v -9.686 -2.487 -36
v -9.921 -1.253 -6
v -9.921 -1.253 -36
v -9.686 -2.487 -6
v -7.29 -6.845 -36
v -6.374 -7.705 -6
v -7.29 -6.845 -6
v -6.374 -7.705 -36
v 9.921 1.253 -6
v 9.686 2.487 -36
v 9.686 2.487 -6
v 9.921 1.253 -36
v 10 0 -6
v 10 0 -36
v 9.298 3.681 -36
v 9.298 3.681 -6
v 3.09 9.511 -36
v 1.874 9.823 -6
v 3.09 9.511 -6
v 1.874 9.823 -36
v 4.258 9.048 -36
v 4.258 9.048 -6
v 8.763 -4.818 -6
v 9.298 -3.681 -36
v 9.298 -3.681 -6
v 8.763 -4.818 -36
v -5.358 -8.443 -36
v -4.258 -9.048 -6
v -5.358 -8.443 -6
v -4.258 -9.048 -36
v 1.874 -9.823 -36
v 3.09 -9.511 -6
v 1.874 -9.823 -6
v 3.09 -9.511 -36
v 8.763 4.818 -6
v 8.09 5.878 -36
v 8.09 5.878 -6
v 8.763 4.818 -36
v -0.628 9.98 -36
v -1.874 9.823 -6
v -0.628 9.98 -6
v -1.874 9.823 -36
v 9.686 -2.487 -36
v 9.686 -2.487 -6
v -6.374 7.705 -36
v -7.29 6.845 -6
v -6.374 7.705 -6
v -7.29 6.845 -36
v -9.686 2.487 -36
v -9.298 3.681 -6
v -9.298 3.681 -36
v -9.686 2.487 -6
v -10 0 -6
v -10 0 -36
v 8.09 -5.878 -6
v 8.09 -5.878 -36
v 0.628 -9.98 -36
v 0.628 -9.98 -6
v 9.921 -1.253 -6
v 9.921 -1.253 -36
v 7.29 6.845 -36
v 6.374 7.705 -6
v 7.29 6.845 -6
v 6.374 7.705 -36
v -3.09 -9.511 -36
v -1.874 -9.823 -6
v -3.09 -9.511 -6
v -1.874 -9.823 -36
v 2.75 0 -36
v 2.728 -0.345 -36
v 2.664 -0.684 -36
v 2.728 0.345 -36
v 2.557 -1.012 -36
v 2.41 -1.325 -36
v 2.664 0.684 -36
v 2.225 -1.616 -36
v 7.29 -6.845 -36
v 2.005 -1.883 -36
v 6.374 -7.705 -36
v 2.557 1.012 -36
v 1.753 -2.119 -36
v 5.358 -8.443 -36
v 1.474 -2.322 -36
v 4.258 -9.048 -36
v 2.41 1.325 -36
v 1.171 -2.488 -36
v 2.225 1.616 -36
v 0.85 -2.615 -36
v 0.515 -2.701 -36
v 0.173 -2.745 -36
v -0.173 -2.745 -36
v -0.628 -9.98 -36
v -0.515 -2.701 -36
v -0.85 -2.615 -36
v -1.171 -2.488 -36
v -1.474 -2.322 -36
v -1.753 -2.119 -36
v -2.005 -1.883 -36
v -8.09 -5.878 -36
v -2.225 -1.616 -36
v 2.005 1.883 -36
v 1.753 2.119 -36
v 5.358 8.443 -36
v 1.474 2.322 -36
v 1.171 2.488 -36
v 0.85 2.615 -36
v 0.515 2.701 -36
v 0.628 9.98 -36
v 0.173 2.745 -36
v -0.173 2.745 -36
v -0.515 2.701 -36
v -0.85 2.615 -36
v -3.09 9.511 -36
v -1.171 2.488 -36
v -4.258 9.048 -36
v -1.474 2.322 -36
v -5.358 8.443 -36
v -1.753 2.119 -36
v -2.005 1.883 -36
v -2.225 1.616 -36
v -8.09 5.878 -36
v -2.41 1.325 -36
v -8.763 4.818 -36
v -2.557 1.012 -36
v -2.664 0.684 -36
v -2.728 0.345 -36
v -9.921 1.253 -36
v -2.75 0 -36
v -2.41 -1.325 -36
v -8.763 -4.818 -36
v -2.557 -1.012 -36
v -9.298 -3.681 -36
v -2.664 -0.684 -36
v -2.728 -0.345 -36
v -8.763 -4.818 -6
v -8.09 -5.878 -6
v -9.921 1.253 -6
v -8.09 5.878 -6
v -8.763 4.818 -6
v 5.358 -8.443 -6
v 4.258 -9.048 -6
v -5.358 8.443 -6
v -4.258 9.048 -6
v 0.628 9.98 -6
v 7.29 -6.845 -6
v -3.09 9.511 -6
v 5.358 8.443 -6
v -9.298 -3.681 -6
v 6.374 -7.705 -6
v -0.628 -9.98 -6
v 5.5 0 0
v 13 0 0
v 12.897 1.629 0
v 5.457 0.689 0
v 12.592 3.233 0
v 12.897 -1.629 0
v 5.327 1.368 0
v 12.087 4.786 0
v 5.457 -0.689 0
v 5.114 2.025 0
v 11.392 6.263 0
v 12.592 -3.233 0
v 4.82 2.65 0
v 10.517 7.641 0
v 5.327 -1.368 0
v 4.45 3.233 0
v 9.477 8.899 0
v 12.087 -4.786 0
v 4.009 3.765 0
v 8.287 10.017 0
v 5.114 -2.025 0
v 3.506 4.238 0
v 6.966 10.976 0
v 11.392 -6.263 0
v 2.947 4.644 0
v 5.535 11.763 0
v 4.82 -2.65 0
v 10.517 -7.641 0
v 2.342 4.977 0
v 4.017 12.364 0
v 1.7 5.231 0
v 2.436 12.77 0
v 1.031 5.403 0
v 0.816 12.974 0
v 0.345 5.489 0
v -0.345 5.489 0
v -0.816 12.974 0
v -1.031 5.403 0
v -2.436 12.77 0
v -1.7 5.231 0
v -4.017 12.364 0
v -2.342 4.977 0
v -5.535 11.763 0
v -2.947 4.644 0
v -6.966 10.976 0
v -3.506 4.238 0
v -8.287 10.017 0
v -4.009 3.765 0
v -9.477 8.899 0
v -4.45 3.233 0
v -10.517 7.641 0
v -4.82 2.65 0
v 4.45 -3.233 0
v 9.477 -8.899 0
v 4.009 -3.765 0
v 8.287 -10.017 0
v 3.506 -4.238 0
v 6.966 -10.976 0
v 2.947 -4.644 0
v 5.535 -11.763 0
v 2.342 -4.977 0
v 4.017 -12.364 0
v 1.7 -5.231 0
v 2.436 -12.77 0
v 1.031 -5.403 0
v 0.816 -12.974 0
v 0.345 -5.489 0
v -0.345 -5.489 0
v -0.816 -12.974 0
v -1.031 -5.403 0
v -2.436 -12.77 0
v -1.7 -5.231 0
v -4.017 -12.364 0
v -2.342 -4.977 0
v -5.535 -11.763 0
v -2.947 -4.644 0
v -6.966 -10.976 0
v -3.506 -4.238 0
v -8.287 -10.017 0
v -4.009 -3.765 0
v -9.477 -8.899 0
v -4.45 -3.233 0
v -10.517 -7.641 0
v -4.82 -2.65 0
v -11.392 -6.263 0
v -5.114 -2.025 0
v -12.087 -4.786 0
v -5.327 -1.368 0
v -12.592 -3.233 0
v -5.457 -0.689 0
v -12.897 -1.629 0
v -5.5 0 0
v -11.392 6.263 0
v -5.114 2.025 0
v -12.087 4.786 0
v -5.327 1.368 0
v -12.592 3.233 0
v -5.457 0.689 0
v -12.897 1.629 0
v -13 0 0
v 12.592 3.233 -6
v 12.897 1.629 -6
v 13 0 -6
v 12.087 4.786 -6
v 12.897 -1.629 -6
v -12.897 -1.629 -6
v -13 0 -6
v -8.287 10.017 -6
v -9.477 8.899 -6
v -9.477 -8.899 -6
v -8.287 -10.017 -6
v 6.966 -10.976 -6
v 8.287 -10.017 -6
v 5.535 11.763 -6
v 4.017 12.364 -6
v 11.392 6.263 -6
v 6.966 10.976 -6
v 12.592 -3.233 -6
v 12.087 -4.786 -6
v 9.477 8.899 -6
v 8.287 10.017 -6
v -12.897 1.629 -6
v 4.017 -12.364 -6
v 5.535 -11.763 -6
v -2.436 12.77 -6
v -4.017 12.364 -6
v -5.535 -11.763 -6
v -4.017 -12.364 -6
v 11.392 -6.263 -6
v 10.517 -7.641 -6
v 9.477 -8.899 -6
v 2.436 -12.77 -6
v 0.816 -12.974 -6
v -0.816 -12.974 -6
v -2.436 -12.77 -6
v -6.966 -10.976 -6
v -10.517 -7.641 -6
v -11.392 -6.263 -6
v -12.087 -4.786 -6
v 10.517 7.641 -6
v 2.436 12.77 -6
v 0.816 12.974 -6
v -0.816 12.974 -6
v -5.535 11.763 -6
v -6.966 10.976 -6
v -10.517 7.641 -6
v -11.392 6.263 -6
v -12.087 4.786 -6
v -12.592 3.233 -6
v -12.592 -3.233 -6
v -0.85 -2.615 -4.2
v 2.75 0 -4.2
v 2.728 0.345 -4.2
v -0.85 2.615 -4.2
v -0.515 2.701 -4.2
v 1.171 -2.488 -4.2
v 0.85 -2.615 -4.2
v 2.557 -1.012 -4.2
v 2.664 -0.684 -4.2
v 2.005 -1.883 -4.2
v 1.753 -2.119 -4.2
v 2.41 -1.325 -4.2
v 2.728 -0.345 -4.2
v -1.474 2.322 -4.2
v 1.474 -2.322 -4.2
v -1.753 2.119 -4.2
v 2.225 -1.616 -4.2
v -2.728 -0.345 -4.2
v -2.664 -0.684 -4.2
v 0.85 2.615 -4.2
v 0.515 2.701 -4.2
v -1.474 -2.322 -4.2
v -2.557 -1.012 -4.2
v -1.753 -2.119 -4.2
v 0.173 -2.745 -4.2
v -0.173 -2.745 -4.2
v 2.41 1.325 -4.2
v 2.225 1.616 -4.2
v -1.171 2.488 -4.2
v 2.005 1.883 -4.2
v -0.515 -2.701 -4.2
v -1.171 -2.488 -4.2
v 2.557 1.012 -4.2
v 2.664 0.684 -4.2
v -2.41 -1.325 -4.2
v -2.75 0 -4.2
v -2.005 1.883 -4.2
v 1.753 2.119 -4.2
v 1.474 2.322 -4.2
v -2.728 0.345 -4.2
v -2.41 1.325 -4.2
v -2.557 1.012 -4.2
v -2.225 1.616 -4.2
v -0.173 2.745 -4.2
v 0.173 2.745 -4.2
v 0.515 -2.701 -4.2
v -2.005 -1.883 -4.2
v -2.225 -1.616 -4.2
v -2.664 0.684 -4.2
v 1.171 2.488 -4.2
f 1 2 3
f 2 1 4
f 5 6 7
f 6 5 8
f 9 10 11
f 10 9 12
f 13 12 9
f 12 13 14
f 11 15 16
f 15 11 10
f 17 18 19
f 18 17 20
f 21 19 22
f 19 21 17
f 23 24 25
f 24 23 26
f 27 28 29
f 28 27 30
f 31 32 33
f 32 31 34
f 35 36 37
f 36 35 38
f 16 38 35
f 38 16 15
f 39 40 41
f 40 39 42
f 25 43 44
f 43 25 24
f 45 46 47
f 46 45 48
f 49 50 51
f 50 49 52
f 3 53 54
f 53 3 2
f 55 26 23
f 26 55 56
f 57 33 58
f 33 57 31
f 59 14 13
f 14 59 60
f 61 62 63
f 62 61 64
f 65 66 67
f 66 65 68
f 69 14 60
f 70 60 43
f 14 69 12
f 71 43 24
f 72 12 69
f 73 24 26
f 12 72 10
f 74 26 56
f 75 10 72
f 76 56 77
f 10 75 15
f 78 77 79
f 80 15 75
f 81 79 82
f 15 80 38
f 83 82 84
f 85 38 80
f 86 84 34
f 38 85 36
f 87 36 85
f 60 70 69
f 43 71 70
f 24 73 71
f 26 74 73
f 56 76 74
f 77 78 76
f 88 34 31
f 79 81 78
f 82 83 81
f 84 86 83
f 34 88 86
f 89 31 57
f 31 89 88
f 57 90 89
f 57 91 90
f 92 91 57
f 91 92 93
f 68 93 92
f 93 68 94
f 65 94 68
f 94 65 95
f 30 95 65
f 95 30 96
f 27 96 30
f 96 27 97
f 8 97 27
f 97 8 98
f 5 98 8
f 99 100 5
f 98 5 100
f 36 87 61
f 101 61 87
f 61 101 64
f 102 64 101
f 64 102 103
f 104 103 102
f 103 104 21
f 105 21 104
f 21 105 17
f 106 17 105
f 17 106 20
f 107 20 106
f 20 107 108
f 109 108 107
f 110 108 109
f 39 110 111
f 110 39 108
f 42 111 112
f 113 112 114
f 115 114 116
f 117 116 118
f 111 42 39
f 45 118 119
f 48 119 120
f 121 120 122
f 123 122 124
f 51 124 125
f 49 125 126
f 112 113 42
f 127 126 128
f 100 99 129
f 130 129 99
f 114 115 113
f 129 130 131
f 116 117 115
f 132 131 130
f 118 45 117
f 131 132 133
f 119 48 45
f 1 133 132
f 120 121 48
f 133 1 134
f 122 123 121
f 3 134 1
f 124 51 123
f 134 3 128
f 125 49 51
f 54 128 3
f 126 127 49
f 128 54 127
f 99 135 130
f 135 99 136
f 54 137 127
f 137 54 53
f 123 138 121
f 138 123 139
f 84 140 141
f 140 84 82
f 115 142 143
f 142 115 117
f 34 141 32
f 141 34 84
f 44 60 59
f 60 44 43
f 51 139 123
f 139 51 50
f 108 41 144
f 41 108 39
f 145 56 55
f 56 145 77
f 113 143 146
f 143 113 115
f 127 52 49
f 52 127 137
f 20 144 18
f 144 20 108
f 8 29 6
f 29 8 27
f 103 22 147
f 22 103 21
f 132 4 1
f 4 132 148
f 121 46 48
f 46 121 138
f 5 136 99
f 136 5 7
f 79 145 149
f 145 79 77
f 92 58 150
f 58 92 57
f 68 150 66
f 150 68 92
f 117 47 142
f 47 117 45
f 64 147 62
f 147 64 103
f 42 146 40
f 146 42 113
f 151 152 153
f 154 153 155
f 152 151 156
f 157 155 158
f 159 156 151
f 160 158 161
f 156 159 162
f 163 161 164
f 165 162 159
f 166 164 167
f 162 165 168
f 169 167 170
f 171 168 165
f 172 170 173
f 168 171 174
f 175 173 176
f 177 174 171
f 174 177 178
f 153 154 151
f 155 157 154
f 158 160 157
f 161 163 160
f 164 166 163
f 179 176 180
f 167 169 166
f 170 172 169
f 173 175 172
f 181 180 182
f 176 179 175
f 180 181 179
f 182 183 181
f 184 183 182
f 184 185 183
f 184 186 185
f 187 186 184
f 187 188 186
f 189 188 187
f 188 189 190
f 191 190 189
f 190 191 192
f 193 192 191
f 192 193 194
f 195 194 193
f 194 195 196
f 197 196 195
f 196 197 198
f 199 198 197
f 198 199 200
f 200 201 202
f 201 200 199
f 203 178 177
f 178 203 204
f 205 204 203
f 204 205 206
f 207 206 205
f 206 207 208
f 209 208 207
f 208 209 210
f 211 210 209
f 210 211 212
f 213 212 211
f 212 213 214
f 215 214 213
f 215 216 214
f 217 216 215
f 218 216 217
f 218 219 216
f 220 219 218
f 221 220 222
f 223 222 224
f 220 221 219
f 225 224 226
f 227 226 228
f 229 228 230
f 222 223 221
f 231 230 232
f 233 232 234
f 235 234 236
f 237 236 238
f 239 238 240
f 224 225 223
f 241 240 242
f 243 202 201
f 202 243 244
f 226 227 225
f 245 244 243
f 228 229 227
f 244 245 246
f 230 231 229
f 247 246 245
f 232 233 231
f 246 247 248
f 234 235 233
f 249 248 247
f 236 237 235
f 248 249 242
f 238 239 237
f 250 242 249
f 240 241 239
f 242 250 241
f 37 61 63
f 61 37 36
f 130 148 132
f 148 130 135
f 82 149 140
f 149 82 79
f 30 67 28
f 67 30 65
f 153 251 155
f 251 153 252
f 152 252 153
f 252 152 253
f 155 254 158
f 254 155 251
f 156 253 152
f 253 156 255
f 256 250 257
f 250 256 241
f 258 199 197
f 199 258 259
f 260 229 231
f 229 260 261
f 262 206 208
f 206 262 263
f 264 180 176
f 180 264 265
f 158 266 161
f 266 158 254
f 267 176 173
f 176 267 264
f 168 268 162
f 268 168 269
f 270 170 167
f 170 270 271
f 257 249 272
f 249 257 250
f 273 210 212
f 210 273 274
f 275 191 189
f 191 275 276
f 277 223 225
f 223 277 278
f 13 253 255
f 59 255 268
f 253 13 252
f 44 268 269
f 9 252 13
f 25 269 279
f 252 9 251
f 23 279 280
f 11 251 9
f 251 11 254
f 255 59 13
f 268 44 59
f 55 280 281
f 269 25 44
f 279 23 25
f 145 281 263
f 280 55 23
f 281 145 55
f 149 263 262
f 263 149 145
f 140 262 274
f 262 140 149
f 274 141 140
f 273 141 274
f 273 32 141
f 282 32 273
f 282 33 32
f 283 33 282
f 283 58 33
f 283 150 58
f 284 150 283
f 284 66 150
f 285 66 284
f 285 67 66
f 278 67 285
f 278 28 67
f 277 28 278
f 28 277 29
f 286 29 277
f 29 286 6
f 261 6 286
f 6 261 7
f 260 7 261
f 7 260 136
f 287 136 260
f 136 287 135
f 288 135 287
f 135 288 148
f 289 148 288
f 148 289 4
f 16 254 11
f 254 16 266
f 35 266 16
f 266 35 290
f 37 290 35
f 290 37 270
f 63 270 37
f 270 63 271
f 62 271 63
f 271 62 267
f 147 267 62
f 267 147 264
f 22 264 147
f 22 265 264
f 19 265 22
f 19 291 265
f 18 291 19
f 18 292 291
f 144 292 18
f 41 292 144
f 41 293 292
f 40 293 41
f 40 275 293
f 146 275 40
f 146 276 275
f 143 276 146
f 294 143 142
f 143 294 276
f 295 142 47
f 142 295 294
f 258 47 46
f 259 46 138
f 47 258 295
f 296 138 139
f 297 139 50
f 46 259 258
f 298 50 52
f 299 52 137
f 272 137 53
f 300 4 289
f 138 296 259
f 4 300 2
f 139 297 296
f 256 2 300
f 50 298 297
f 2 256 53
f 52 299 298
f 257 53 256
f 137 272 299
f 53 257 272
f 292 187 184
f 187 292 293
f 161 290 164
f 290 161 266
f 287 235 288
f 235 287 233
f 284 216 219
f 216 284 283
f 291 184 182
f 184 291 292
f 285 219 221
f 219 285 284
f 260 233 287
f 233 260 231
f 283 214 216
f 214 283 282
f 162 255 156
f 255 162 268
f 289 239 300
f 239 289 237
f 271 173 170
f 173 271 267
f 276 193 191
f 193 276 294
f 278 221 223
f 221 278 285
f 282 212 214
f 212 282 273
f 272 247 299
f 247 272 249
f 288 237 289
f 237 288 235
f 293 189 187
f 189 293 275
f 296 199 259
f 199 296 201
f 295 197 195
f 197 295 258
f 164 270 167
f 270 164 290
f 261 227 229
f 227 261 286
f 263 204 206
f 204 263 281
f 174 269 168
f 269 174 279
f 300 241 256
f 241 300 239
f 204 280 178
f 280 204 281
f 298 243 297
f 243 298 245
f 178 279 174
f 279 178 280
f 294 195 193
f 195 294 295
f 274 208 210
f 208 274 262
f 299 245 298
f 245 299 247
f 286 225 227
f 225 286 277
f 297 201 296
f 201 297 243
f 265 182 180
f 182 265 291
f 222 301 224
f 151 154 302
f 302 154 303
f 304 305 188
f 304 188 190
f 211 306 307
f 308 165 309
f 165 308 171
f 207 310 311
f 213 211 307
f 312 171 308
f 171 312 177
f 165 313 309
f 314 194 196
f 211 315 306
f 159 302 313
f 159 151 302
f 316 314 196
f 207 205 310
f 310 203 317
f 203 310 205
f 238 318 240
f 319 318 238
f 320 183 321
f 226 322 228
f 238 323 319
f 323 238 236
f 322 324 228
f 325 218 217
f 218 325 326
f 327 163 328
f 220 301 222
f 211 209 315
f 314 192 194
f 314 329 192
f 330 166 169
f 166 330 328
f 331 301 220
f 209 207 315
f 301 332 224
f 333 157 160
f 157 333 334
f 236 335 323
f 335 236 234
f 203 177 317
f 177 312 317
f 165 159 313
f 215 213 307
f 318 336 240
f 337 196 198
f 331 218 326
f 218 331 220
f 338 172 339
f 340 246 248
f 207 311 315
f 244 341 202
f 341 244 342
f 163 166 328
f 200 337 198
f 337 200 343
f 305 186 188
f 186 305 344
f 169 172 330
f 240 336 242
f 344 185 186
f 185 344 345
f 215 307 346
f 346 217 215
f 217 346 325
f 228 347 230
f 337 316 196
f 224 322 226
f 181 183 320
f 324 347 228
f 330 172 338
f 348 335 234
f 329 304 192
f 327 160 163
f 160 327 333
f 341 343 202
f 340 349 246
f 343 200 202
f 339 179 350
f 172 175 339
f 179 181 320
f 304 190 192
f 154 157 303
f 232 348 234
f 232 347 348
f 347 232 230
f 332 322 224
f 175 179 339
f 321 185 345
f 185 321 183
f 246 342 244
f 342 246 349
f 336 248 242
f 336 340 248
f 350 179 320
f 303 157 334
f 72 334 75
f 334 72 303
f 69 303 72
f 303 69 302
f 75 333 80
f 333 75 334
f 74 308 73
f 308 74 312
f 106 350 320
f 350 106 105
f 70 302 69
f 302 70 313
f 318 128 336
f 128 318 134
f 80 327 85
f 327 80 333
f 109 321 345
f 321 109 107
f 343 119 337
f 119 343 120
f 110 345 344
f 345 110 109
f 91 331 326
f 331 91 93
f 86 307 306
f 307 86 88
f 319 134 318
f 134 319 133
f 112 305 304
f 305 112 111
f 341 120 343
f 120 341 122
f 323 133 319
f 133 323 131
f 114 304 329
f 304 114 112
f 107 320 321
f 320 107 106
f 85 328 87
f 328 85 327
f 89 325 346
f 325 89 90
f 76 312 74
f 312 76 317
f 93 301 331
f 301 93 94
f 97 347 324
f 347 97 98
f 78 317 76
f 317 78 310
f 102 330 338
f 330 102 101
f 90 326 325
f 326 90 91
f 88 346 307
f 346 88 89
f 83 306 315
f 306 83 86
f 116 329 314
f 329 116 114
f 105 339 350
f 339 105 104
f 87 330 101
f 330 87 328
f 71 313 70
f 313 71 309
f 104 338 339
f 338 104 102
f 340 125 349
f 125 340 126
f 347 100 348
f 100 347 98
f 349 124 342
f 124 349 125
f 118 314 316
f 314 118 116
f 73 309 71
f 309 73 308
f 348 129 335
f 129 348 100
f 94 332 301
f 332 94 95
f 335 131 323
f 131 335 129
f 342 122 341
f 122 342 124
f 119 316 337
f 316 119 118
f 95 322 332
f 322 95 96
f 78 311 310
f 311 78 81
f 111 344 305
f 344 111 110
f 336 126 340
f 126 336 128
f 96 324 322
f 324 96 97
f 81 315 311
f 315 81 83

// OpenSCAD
$fn = 50;


difference() {
	union() {
		translate(v = [0, 0, -36.0000000000]) {
			cylinder(h = 36, r = 10.0000000000);
		}
		translate(v = [0, 0, -6.0000000000]) {
			cylinder(h = 6, r = 13.0000000000);
		}
	}
	union() {
		translate(v = [0, 0, 0]) {
			rotate(a = [0, 0, 0]) {
				difference() {
					union() {
						#translate(v = [0, 0, -36.0000000000]) {
							cylinder(h = 36, r = 2.2500000000);
						}
						#translate(v = [0, 0, -4.2000000000]) {
							cylinder(h = 4.2000000000, r = 10.0000000000, r1 = 2.7500000000, r2 = 5.5000000000);
						}
						#translate(v = [0, 0, -36.0000000000]) {
							cylinder(h = 36, r = 2.7500000000);
						}
						#translate(v = [0, 0, -36.0000000000]) {
							cylinder(h = 36, r = 2.2500000000);
						}
					}
					union();
				}
			}
		}
	}
}
